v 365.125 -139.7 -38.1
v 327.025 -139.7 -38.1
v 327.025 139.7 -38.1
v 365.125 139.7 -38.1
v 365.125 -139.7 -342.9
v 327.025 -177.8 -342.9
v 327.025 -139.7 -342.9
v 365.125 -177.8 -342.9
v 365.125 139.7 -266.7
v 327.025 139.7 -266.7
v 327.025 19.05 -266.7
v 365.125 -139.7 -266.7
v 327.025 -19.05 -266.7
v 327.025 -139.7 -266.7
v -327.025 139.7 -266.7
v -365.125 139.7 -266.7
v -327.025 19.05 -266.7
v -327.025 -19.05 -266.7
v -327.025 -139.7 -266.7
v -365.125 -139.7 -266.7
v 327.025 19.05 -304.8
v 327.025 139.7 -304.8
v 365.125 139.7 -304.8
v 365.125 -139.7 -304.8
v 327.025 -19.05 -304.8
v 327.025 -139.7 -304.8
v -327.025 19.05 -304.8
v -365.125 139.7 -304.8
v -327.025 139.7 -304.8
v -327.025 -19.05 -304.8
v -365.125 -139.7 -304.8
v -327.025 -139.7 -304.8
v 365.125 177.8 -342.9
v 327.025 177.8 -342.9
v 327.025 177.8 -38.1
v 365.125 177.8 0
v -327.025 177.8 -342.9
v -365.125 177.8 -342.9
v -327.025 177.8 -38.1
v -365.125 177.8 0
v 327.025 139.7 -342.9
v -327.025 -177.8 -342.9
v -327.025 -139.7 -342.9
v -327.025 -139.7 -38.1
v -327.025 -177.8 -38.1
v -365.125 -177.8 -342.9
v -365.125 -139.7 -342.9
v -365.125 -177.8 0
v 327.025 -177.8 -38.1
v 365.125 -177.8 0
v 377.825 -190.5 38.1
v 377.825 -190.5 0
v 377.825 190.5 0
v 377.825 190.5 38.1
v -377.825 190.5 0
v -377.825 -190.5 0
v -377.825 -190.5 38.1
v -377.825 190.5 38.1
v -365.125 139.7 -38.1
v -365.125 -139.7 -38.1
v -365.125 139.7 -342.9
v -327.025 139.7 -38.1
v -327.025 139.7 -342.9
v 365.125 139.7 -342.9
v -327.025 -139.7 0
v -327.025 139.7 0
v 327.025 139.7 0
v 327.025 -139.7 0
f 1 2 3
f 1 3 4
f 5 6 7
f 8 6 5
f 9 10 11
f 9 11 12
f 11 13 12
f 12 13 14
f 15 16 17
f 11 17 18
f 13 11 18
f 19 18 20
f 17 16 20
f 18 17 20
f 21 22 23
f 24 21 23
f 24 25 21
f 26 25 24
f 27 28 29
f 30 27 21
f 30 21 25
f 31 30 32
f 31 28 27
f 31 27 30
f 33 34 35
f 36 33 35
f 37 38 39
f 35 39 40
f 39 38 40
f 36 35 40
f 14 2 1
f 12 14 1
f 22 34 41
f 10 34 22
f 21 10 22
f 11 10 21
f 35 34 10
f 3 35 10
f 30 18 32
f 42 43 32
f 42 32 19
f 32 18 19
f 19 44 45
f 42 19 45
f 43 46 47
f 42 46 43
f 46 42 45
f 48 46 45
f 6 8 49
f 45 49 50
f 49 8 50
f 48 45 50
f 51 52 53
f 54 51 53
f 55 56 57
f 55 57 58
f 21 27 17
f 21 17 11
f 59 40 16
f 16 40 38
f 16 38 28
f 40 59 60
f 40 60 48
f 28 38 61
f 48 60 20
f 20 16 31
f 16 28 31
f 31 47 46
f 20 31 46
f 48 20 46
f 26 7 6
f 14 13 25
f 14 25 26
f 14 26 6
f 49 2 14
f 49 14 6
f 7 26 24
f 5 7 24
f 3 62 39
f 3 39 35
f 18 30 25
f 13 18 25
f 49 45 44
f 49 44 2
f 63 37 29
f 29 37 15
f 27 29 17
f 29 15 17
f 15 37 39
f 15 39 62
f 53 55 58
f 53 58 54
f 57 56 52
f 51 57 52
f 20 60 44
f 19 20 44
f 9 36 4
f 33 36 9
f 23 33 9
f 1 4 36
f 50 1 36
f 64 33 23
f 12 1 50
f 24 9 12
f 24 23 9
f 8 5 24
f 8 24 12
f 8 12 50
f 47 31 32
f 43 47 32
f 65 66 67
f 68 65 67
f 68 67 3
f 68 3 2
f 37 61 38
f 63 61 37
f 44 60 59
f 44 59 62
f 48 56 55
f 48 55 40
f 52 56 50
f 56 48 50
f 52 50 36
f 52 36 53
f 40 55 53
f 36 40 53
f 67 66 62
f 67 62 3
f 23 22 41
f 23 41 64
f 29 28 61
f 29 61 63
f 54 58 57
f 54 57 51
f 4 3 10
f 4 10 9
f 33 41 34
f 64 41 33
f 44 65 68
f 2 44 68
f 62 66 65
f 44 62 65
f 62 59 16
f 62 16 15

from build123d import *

# Parameters (mm, degrees)
F0_W      = 755.65
F0_H      = 381
F1_DEPTH  = 38.1
F2_W      = 730.25
F2_H      = 355.6
F2_W_2    = 654.05
F2_H_2    = 279.4
F3_DEPTH  = 38.1
F4_W      = 38.1
F4_H      = 38.1
F5_DEPTH  = 304.8
F6_W      = 355.6
F6_H      = 38.1
F7_DEPTH  = 38.1
F8_W      = 355.6
F8_H      = 38.1
F9_DEPTH  = 38.1
F10_W     = 730.25
F10_H     = 38.1
F11_DEPTH = 38.1


with BuildPart() as f1:
    # F0 (on Top) → F1 (new body)
    with BuildSketch(Plane.XY):
        Rectangle(F0_W, F0_H)
    extrude(amount=F1_DEPTH)

    # F2 (on face) → F3 (join)
    with BuildSketch(Plane(origin=(0, 0, 0), x_dir=(1, 0, 0), z_dir=(0, 0, -1))):
        Rectangle(F2_W, F2_H)
        Rectangle(F2_W_2, F2_H_2, mode=Mode.SUBTRACT)
    extrude(amount=F3_DEPTH)

    # F4 (on face) → F5 (join)
    with BuildSketch(Plane(origin=(0, 0, -38.1), x_dir=(1, 0, 0), z_dir=(0, 0, -1))):
        with Locations((-346.075, 158.75)):
            Rectangle(F4_W, F4_H)
        with Locations((346.075, 158.75)):
            Rectangle(F4_W, F4_H)
        with Locations((346.075, -158.75)):
            Rectangle(F4_W, F4_H)
        with Locations((-346.075, -158.75)):
            Rectangle(F4_W, F4_H)
    extrude(amount=F5_DEPTH)

    # F6 (on face) → F7 (join)
    with BuildSketch(Plane(origin=(-365.125, 0, 0), x_dir=(0, -1, 0), z_dir=(-1, 0, 0))):
        with Locations((0, -285.75)):
            Rectangle(F6_W, F6_H)
    extrude(amount=-F7_DEPTH)

    # F8 (on face) → F9 (join)
    with BuildSketch(Plane.YZ.offset(365.125)):
        with Locations((0, -285.75)):
            Rectangle(F8_W, F8_H)
    extrude(amount=-F9_DEPTH)

    # F10 (on face) → F11 (join)
    with BuildSketch(Plane(origin=(0, 0, -304.8), x_dir=(1, 0, 0), z_dir=(0, 0, -1))):
        Rectangle(F10_W, F10_H)
    extrude(amount=-F11_DEPTH)


solid = f1.part
